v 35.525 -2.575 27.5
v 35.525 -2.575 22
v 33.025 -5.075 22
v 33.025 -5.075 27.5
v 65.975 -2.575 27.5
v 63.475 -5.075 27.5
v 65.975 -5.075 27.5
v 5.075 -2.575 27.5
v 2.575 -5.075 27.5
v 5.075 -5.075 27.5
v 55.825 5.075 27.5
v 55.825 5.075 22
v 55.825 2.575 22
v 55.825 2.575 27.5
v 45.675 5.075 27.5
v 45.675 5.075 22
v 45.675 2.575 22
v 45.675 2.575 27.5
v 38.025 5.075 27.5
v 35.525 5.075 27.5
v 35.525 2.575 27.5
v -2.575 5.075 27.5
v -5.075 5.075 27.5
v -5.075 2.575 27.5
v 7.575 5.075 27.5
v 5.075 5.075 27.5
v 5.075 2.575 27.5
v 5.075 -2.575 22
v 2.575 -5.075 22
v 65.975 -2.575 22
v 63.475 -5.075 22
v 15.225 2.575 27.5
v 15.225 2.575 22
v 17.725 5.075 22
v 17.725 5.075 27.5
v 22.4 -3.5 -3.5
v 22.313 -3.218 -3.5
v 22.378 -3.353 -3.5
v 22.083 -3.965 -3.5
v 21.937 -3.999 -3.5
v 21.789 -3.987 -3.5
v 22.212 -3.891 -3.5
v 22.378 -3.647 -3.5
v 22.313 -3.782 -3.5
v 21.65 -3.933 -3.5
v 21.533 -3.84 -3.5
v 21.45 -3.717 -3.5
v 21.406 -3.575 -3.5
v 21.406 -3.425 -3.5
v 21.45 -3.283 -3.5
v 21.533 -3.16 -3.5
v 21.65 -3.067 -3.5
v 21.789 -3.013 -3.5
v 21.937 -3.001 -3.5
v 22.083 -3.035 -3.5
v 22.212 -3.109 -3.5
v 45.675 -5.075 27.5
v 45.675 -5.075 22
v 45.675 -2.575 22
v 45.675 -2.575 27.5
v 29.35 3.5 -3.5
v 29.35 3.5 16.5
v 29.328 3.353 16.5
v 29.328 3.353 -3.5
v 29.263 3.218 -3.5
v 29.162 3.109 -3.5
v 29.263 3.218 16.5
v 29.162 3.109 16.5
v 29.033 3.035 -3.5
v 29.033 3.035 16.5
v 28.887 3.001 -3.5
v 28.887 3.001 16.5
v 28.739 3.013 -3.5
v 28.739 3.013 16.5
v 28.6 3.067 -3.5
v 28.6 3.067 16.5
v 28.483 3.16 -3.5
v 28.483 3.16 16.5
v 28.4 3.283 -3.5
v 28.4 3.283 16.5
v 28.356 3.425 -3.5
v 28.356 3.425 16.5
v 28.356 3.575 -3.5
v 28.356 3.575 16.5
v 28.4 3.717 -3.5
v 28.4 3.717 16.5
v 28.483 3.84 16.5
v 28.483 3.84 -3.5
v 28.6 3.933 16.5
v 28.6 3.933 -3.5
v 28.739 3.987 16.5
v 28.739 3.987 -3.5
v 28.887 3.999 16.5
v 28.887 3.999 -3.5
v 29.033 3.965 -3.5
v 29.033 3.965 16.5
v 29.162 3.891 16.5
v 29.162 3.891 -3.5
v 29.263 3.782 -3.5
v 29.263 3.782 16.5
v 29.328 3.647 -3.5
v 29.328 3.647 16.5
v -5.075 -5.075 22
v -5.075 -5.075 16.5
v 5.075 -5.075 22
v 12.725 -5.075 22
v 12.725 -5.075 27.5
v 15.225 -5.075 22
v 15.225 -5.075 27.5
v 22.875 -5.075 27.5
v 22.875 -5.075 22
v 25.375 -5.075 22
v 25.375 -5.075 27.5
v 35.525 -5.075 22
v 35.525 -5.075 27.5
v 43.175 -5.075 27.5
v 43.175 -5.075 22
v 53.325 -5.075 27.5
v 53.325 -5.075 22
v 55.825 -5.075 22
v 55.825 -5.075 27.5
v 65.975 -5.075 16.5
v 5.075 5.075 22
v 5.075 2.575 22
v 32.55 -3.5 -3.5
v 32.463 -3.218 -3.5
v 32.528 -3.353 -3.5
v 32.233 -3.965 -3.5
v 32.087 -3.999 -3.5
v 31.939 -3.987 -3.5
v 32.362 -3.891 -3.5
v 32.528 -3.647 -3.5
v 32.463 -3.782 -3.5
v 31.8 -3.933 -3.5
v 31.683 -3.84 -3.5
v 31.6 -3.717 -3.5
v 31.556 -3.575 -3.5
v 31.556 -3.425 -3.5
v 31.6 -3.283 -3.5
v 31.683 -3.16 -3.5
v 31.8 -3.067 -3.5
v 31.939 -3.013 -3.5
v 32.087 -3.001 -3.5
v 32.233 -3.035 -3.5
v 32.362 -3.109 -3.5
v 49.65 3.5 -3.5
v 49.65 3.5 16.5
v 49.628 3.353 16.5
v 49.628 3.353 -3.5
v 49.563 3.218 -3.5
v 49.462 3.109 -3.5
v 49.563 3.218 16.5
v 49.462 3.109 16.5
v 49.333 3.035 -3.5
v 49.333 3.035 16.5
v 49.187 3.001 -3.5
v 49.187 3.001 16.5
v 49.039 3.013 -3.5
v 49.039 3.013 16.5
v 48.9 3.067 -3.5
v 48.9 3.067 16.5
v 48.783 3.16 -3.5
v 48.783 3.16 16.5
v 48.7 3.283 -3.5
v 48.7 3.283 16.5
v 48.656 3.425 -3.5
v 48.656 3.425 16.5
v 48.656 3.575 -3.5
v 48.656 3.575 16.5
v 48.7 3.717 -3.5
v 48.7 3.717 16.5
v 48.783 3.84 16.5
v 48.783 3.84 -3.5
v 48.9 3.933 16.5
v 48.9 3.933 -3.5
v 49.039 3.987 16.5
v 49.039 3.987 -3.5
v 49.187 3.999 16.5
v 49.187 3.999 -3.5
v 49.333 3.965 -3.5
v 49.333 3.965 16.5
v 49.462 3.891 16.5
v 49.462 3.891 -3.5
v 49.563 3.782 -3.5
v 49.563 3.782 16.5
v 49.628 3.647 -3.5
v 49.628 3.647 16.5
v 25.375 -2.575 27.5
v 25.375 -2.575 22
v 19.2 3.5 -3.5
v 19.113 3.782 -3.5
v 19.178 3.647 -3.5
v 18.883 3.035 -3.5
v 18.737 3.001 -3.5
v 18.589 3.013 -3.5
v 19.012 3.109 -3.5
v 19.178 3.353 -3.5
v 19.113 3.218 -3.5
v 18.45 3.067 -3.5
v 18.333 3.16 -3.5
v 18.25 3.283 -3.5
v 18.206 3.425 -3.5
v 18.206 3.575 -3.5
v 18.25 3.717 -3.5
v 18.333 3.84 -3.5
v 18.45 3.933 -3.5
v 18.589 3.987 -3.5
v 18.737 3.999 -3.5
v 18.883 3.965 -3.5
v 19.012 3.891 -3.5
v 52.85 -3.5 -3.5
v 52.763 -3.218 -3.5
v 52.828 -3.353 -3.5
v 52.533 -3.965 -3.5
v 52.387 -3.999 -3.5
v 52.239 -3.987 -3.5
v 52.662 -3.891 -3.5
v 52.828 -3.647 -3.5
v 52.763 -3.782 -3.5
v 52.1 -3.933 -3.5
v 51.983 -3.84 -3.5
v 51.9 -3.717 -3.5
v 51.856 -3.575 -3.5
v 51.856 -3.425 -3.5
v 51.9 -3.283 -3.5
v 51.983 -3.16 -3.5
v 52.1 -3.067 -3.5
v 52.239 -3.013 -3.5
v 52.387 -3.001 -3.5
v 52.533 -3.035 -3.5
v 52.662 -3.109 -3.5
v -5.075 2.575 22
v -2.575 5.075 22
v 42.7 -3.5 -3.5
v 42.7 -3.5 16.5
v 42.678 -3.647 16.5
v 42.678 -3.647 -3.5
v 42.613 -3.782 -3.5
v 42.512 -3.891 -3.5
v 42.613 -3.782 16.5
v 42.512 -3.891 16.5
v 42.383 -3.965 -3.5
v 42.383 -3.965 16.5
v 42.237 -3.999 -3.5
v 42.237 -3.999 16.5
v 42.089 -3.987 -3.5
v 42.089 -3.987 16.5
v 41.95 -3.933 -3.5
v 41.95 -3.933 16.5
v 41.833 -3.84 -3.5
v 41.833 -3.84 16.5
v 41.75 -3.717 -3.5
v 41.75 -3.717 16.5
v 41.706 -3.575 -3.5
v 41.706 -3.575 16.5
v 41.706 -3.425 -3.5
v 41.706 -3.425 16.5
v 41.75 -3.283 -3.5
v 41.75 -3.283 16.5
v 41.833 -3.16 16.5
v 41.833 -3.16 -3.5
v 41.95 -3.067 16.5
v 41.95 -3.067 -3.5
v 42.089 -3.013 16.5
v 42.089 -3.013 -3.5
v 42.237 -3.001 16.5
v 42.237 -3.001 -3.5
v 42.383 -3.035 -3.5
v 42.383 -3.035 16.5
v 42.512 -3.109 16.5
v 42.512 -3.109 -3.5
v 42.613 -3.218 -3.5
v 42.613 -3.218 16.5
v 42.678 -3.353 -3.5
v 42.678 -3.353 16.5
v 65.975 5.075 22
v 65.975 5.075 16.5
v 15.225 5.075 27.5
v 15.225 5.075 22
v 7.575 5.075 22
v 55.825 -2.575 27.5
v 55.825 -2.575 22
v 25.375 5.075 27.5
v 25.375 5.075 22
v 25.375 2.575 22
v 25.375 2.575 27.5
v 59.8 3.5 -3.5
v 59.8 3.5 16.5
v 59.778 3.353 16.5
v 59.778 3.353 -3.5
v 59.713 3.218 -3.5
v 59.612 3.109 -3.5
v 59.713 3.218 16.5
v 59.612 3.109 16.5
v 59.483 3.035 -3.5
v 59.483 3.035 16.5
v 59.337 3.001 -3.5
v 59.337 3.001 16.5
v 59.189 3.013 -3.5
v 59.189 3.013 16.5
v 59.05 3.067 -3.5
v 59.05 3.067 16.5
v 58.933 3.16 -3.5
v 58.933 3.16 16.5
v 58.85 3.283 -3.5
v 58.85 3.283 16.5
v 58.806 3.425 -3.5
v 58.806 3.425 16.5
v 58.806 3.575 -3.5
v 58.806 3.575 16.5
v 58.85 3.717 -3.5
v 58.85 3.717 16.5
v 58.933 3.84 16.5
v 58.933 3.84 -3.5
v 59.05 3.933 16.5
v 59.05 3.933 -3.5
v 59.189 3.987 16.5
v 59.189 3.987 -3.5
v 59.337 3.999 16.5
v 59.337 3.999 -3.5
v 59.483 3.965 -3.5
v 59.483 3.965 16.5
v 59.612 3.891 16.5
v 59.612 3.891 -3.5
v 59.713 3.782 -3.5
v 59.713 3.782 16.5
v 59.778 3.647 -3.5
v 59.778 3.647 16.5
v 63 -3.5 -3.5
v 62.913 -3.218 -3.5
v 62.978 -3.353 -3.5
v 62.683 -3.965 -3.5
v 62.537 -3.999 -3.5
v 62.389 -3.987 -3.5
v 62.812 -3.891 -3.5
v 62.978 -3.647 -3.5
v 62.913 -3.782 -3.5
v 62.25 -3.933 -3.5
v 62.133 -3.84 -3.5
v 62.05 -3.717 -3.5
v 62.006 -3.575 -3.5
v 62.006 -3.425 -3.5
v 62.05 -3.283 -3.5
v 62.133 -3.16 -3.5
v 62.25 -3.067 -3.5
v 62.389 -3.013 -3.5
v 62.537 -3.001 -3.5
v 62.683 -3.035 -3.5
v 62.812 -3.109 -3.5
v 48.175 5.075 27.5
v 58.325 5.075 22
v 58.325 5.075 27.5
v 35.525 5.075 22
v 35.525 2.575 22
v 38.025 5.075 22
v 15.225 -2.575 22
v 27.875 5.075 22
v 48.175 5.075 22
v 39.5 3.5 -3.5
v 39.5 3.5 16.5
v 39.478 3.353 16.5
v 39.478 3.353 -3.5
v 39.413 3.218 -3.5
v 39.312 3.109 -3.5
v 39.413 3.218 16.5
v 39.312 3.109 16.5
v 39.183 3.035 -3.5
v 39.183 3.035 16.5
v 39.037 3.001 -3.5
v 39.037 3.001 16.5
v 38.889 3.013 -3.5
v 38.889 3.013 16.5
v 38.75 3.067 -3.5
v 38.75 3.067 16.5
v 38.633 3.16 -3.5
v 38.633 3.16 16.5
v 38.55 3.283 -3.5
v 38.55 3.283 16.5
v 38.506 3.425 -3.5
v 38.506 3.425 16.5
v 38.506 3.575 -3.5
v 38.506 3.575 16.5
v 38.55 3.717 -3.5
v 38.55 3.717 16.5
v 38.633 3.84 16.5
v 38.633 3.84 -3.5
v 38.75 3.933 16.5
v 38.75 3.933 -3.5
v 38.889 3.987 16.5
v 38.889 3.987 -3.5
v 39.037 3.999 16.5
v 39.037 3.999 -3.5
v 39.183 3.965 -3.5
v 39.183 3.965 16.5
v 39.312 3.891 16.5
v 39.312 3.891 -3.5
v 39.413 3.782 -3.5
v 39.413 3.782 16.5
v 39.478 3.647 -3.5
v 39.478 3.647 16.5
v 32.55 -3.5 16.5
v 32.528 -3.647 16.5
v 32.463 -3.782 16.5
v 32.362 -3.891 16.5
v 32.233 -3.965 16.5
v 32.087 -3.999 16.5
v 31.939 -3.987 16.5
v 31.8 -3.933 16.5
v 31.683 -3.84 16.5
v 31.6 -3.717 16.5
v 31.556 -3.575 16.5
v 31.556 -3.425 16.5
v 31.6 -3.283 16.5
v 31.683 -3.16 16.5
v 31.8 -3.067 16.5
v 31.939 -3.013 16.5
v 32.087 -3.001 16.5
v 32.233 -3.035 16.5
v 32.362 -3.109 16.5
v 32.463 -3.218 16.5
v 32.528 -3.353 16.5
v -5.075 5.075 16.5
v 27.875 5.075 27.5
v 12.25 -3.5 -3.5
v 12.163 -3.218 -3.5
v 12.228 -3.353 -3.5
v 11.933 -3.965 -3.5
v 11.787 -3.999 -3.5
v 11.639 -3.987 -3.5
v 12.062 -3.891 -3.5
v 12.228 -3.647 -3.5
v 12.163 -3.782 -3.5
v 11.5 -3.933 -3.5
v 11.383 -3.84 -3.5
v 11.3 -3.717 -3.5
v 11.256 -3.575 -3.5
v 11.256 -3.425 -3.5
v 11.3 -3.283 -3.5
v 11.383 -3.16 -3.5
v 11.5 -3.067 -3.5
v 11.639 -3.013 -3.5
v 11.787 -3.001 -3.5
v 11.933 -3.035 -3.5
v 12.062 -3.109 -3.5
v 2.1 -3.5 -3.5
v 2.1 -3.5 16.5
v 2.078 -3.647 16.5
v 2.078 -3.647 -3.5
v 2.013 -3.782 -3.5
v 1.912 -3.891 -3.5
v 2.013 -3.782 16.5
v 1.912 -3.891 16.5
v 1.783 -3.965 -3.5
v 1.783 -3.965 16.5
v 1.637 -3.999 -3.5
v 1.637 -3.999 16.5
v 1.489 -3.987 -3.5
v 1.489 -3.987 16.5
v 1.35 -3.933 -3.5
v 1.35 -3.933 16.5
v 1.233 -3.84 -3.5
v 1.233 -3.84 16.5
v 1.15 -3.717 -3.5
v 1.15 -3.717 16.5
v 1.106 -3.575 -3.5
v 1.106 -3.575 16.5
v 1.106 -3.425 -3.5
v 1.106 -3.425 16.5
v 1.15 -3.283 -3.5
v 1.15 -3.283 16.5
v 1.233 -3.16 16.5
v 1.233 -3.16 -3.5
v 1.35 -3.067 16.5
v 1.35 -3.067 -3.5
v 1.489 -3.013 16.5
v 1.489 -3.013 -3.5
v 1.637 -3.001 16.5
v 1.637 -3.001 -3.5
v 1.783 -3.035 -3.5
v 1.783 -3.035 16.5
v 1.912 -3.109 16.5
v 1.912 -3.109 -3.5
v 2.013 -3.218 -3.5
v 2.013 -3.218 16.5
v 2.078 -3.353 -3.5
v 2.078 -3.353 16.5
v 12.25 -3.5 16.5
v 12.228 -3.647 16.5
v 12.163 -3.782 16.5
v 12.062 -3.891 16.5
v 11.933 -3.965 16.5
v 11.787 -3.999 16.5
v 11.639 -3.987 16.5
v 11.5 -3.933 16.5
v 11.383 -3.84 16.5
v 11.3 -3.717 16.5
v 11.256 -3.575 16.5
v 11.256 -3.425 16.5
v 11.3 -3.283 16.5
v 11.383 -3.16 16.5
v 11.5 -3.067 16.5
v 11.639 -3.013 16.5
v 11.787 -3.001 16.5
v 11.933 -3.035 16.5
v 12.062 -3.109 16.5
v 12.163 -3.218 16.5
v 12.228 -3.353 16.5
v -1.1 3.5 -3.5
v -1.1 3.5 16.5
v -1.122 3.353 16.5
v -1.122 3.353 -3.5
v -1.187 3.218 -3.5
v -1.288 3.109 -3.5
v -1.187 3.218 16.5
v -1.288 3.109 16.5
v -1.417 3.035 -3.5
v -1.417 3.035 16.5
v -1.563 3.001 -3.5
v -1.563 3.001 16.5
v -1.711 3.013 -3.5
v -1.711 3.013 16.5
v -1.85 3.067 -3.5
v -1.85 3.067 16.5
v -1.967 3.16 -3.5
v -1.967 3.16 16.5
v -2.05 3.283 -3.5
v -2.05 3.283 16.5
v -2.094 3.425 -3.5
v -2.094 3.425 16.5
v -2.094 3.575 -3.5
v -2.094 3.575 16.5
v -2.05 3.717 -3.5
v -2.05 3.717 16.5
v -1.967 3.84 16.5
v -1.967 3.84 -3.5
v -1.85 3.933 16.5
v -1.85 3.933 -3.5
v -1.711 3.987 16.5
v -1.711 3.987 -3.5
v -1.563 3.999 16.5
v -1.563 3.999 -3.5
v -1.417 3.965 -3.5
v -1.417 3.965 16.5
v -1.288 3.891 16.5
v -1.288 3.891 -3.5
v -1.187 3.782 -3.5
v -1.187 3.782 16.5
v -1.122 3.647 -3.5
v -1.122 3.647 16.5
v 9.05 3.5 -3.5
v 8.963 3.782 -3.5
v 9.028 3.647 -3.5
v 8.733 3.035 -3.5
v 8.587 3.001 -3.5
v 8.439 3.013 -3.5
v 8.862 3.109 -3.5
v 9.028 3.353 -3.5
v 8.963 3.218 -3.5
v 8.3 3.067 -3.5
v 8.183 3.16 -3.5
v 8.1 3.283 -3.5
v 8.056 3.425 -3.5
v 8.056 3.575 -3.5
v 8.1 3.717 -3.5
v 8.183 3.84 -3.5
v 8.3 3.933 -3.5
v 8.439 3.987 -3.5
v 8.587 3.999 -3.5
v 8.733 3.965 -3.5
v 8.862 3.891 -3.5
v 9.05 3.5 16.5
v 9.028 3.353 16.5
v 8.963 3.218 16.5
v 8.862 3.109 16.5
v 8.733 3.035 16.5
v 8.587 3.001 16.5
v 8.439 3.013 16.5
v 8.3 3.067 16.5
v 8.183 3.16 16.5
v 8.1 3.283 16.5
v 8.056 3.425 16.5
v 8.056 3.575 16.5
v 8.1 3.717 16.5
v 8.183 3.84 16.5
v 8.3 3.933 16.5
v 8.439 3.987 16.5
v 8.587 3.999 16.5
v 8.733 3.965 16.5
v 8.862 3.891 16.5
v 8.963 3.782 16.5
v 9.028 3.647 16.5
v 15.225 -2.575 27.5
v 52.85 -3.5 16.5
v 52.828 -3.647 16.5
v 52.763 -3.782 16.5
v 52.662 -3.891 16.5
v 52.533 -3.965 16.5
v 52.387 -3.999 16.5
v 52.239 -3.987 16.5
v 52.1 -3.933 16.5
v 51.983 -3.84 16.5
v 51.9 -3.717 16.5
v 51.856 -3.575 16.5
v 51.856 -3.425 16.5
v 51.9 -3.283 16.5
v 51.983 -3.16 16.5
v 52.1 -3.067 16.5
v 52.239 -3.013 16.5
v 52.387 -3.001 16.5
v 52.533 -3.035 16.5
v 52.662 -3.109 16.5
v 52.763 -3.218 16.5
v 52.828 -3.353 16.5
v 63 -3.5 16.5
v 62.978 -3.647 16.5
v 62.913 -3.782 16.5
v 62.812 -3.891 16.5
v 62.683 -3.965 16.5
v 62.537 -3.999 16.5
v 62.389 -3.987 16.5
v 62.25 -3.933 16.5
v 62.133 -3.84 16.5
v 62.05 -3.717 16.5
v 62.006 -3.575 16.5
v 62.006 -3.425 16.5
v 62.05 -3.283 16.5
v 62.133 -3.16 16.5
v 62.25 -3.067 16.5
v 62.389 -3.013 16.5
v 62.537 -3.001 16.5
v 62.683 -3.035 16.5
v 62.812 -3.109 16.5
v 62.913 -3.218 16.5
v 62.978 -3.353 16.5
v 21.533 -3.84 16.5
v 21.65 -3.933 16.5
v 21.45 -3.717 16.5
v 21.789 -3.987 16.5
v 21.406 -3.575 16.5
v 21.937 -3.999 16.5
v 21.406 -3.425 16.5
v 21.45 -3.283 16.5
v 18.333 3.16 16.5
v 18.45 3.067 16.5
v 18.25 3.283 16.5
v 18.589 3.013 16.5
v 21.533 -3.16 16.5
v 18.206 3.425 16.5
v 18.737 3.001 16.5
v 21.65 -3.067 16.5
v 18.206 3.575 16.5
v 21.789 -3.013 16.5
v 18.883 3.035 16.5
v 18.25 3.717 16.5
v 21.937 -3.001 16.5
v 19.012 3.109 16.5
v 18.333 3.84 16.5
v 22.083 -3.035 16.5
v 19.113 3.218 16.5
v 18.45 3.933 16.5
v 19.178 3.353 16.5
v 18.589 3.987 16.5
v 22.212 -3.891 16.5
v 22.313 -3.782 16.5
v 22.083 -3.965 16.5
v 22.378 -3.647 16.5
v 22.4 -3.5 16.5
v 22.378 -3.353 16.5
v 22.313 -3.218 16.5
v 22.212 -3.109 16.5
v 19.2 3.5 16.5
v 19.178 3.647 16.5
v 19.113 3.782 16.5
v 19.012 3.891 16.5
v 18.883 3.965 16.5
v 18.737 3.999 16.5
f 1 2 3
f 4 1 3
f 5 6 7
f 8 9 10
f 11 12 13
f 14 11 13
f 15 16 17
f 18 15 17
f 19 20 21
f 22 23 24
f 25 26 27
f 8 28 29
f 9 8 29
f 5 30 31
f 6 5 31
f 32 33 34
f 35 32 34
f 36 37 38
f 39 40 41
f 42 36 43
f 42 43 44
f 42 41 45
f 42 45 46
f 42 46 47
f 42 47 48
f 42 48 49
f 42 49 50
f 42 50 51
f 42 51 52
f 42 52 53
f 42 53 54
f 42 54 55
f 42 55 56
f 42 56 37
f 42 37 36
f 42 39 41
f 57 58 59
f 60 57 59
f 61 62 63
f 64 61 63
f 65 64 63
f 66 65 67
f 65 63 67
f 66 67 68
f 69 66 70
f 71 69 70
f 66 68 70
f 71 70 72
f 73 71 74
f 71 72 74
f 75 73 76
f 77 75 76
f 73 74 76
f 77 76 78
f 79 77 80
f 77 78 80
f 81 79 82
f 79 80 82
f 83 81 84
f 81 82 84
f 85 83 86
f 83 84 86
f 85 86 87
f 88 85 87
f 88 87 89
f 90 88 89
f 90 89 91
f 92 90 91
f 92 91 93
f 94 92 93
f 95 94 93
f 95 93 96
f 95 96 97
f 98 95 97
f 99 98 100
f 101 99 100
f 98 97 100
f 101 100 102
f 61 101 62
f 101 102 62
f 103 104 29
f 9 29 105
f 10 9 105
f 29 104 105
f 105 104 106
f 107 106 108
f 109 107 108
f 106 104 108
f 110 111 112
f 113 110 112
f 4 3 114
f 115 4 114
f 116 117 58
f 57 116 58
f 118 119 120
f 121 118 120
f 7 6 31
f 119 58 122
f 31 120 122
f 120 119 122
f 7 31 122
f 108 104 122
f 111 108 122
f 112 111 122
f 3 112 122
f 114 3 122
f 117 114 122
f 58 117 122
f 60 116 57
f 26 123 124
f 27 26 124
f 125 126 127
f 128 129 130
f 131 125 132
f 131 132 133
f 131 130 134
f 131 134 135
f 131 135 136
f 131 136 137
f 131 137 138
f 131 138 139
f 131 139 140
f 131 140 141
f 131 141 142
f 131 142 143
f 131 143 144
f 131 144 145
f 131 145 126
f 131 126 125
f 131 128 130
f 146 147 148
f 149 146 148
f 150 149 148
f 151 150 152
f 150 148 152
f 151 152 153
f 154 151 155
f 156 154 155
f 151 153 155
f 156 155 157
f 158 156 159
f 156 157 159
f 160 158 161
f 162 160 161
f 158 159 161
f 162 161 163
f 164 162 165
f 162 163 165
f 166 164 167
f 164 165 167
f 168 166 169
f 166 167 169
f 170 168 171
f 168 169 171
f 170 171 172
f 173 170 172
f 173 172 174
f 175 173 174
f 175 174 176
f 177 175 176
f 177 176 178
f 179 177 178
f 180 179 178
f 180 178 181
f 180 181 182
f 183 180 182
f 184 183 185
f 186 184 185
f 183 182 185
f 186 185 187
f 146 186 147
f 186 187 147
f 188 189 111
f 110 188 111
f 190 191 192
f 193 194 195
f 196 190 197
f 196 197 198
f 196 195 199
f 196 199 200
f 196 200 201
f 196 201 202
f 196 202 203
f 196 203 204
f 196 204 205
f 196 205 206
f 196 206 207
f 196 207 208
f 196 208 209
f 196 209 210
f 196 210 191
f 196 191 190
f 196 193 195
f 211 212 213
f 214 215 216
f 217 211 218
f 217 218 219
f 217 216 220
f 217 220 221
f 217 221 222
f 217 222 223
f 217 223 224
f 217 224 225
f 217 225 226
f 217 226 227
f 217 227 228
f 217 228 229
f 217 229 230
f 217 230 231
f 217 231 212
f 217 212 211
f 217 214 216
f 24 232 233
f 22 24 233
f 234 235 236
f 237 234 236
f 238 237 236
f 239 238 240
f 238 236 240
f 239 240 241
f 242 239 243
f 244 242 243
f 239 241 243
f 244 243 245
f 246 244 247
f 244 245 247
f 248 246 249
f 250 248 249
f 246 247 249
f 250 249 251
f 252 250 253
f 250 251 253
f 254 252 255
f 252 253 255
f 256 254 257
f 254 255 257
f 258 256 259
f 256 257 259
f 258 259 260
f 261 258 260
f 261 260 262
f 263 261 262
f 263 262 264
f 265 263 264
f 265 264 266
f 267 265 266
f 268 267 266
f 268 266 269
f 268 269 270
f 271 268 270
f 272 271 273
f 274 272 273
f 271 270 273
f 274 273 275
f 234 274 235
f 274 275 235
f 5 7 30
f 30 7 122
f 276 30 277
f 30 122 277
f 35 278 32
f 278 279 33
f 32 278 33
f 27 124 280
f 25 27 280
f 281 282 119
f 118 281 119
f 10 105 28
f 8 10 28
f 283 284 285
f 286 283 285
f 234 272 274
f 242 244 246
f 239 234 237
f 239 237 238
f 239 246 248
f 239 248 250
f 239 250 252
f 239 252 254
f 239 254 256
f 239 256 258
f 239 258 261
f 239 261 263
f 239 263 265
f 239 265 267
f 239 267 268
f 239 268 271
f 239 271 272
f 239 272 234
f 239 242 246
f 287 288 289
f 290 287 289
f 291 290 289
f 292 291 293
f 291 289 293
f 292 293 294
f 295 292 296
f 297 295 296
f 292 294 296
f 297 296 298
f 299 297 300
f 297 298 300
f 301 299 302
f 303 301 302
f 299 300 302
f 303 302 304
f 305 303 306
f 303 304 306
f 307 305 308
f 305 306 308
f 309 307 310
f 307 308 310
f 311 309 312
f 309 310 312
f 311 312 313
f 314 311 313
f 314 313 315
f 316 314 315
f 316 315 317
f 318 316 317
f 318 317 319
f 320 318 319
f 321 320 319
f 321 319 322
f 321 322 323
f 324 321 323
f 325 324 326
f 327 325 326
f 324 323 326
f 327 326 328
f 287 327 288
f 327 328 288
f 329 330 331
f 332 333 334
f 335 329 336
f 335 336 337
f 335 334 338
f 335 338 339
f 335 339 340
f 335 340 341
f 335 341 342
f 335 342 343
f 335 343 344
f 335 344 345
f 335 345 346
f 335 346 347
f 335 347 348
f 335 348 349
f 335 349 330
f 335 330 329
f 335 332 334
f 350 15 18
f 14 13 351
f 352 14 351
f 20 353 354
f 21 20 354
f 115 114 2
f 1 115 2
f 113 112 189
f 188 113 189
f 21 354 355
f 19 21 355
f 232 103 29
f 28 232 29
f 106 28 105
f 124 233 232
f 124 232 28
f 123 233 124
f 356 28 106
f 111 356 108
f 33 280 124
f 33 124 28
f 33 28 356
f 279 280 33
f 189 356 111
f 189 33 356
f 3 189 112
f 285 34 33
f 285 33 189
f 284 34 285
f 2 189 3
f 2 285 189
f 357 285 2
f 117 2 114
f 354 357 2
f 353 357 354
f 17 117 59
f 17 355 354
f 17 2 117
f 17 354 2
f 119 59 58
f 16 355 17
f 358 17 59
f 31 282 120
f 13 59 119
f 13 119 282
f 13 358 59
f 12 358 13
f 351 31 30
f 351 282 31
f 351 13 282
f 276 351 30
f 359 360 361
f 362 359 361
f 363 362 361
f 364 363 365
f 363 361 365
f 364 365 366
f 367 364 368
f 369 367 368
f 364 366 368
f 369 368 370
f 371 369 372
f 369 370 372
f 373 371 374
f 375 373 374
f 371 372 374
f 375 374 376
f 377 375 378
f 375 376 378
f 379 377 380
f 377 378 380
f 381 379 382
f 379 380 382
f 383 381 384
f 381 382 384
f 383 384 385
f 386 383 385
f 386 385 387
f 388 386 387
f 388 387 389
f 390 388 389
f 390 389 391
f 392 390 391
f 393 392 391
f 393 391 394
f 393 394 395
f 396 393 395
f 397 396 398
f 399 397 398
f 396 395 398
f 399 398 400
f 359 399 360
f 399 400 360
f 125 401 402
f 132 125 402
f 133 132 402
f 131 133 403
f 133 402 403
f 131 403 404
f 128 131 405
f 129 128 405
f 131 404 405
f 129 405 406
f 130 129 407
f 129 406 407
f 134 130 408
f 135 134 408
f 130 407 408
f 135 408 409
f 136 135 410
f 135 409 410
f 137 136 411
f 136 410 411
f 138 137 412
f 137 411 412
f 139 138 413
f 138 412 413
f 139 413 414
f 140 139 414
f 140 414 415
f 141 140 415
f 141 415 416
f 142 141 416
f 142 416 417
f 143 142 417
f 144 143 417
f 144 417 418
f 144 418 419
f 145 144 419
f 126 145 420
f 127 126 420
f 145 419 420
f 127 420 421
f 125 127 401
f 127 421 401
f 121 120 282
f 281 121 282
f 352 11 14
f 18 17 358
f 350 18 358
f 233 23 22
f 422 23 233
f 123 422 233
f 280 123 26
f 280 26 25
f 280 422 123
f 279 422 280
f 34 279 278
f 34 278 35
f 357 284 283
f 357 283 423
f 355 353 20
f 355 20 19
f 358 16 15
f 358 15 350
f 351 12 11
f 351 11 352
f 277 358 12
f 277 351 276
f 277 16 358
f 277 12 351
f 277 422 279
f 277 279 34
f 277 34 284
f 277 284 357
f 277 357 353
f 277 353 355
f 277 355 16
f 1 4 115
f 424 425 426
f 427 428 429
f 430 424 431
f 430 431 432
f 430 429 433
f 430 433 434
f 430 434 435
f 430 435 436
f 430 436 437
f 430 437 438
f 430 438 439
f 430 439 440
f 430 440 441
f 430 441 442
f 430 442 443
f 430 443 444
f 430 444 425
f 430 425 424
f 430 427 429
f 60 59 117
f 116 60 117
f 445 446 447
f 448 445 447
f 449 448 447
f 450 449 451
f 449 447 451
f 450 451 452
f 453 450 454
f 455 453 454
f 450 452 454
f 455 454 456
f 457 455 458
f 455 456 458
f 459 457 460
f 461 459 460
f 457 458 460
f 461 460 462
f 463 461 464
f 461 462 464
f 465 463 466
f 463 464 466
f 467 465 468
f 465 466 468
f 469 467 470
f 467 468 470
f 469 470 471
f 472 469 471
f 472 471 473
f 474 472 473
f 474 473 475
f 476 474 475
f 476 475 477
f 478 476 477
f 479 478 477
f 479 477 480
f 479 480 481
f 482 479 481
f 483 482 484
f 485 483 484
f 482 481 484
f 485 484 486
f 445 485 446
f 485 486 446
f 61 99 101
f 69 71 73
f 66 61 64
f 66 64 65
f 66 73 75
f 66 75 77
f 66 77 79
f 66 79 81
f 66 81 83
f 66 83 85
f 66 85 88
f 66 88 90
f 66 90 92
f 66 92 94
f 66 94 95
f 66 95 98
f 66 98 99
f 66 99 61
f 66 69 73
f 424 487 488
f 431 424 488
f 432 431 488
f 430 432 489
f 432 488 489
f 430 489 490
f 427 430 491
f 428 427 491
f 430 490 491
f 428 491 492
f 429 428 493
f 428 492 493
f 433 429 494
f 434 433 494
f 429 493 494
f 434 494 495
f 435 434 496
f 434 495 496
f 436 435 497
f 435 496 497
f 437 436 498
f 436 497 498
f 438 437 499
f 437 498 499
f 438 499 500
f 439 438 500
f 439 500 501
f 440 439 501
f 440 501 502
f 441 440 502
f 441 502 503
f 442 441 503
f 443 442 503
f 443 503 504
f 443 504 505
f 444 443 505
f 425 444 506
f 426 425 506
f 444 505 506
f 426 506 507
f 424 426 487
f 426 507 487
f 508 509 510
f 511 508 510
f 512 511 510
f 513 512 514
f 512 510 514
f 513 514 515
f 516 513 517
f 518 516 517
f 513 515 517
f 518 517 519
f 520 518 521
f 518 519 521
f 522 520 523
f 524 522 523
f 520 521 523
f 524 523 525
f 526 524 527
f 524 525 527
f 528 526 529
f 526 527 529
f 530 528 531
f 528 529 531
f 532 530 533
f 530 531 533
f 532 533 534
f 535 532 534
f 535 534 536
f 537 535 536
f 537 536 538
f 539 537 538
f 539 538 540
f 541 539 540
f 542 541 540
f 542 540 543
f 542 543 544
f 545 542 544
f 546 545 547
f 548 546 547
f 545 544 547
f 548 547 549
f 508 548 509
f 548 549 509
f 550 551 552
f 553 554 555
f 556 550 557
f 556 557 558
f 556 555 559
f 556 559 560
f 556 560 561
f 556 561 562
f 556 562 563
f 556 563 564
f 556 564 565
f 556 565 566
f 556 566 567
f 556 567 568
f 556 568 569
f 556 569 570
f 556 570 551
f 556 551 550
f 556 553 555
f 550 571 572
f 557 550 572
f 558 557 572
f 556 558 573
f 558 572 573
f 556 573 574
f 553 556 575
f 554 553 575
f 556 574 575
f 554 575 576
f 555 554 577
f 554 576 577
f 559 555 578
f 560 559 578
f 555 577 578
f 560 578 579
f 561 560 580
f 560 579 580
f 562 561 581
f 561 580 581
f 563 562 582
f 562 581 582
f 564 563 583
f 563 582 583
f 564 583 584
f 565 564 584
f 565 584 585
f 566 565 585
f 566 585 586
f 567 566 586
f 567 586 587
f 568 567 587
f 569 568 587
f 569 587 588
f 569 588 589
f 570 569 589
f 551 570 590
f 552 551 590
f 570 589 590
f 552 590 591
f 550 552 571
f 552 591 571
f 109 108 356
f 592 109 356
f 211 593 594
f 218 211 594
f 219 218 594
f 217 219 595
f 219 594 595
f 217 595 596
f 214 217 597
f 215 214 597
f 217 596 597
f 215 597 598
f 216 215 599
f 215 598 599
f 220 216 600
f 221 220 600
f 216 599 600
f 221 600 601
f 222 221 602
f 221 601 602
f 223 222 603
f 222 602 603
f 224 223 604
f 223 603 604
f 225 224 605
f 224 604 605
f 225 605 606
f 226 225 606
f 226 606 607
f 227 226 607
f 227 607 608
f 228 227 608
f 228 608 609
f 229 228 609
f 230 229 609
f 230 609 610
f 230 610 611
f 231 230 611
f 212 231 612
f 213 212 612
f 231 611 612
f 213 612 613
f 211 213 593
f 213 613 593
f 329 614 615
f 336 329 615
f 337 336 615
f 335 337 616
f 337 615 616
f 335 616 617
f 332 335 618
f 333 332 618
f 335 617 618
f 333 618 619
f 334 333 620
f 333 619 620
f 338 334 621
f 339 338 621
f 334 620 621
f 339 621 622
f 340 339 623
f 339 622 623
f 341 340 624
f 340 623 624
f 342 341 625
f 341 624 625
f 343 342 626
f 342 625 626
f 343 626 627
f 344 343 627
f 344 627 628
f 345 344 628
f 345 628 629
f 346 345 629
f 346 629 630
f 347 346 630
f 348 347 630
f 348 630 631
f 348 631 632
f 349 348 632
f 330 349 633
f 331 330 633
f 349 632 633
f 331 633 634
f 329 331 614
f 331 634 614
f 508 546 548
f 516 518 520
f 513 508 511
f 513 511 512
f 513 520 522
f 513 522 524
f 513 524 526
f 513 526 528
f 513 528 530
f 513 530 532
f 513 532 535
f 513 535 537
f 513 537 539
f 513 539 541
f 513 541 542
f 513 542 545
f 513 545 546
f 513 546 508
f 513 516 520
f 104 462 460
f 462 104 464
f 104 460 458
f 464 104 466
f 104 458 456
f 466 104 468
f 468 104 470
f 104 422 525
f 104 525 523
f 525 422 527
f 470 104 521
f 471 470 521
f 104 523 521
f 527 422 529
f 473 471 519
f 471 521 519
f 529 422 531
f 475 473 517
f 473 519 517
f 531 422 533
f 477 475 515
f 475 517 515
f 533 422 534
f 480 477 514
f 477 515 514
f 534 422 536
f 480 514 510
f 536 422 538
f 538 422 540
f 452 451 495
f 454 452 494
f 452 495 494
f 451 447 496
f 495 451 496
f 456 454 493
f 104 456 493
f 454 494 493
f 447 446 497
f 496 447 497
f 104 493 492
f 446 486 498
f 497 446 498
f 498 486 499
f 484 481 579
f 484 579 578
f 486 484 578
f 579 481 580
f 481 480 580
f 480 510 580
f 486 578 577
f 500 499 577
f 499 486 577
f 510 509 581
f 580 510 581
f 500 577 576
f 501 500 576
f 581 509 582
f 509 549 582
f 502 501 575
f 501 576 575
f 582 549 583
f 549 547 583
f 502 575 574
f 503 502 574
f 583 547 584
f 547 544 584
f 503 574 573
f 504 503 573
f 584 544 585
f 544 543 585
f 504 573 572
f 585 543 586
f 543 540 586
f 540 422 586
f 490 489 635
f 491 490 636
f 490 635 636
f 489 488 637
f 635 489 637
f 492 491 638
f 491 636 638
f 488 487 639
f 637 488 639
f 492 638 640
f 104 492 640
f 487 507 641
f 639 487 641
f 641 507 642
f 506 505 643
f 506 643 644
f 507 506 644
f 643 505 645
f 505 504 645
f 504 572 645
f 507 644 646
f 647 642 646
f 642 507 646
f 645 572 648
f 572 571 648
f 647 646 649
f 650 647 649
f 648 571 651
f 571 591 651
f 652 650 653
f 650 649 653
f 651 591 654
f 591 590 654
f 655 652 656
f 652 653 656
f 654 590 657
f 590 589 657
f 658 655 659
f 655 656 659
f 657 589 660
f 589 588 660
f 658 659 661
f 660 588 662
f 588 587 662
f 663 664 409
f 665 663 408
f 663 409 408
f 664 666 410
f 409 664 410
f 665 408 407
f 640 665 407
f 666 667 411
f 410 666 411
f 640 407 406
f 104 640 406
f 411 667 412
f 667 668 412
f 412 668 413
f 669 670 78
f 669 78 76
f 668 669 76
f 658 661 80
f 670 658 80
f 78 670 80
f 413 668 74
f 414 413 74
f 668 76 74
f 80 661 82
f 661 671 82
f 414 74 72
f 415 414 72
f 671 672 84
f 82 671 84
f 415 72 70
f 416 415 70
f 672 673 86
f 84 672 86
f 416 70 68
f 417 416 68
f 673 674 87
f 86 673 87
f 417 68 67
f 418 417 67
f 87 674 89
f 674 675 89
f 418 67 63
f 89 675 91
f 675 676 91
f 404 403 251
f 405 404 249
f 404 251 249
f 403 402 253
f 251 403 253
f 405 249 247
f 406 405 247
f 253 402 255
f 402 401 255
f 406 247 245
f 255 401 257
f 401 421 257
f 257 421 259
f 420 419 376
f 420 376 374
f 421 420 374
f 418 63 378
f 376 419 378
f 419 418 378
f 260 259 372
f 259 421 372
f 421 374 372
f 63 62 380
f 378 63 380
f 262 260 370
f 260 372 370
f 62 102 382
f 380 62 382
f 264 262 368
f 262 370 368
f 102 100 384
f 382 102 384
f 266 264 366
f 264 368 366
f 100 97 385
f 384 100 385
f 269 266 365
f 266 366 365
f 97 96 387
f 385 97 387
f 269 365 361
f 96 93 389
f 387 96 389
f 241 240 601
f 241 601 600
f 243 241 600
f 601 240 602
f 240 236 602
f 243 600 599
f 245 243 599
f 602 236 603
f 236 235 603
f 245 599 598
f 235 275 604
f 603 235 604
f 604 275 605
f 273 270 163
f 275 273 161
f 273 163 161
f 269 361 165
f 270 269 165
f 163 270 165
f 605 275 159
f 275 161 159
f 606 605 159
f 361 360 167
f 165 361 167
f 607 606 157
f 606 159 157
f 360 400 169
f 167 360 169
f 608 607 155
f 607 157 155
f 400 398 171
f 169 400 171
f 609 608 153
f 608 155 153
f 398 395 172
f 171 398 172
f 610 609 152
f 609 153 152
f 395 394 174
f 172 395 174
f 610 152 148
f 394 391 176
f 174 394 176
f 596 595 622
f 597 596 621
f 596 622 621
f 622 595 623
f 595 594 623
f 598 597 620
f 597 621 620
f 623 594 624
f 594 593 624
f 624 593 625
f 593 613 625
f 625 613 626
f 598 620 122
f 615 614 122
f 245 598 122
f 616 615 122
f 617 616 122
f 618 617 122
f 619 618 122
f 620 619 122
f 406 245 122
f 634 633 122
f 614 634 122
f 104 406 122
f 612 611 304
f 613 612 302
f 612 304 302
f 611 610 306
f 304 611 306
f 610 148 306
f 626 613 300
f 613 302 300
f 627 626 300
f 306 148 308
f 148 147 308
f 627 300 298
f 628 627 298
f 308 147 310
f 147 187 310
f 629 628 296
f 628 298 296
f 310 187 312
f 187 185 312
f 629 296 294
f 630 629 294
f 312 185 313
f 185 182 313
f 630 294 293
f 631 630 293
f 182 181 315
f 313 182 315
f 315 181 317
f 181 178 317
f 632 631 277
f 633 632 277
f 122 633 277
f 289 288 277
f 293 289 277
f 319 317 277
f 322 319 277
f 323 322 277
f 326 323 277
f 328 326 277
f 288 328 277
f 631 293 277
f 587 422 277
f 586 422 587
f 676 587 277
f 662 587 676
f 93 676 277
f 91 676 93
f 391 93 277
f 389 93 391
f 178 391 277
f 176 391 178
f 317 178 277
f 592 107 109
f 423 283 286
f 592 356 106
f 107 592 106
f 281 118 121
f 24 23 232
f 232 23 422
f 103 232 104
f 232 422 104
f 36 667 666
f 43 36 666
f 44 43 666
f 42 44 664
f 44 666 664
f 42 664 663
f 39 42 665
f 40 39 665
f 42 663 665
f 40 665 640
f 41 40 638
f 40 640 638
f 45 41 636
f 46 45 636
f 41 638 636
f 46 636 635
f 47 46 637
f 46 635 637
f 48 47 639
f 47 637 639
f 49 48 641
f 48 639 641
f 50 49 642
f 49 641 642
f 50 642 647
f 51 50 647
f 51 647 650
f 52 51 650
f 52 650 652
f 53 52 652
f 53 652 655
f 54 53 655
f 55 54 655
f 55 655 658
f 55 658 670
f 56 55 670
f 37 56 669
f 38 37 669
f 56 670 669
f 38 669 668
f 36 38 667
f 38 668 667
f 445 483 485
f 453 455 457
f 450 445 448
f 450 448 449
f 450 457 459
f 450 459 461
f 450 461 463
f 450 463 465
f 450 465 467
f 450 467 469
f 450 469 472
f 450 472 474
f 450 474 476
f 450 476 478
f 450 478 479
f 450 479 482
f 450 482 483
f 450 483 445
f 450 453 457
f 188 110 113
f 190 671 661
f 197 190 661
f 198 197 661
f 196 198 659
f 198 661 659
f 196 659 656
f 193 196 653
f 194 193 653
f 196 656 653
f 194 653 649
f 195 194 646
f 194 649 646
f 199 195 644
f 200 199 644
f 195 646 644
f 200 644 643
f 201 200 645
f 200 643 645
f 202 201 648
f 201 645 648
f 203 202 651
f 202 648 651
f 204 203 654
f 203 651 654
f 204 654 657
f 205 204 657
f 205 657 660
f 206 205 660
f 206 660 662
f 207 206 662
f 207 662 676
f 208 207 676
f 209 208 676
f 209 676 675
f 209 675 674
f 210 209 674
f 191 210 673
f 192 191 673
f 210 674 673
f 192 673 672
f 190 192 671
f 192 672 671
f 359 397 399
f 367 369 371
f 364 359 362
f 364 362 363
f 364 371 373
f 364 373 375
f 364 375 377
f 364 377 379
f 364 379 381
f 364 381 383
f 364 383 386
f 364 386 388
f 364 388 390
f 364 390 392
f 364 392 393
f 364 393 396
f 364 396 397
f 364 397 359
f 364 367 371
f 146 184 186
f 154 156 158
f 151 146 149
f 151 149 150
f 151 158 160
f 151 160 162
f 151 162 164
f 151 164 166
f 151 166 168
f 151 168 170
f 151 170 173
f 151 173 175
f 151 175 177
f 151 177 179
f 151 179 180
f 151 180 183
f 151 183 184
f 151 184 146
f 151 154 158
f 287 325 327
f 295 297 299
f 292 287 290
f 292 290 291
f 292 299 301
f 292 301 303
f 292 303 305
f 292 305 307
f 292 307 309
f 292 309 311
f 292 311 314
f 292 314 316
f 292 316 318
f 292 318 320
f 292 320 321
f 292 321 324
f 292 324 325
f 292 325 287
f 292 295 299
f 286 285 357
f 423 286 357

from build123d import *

# Parameters (mm, degrees)
SKETCH_W            = 10.15
SKETCH_H            = 10.15
PAD_DEPTH           = 5.5
PAD001_DEPTH        = 5.5
SKETCH003_R         = 0.5
PAD003_DEPTH        = 20
LINEARPATTERN_COUNT = 7
LINEARPATTERN_PITCH = 10.15


with BuildPart() as part:
    # Sketch → Pad (new body)
    with BuildSketch(Plane.XY):
        Rectangle(SKETCH_W, SKETCH_H)
    pad = extrude(amount=PAD_DEPTH)

    # Sketch001 (on Face6 of Pad) → Pad001 (join)
    with BuildSketch(Plane.XY.offset(5.5)):
        Polygon((-5.075, 2.575), (-2.575, 5.075), (-5.075, 5.075), align=None)
        Polygon((2.575, -5.075), (5.075, -5.075), (5.075, -2.575), align=None)
    pad001 = extrude(amount=PAD001_DEPTH)

    # Sketch003 (on Face4 of Pad001) → Pad003 (join)
    with BuildSketch(Plane(origin=(0, 0, 0), x_dir=(1, 0, 0), z_dir=(0, 0, -1))):
        with Locations((1.6, 3.5)):
            Circle(SKETCH003_R)
        with Locations((-1.6, -3.5)):
            Circle(SKETCH003_R)
    pad003 = extrude(amount=PAD003_DEPTH)

    # LinearPattern: Pad, Pad001, Pad003 ×7
    with Locations(*[(i * LINEARPATTERN_PITCH, 0, 0) for i in range(1, LINEARPATTERN_COUNT)]):
        add(pad)
        add(pad001)
        add(pad003)


with BuildPart() as part_1:
    # Body placement: moved
    add(part.part.moved(Location((0, 0, 16.5))))


solid = part_1.part
